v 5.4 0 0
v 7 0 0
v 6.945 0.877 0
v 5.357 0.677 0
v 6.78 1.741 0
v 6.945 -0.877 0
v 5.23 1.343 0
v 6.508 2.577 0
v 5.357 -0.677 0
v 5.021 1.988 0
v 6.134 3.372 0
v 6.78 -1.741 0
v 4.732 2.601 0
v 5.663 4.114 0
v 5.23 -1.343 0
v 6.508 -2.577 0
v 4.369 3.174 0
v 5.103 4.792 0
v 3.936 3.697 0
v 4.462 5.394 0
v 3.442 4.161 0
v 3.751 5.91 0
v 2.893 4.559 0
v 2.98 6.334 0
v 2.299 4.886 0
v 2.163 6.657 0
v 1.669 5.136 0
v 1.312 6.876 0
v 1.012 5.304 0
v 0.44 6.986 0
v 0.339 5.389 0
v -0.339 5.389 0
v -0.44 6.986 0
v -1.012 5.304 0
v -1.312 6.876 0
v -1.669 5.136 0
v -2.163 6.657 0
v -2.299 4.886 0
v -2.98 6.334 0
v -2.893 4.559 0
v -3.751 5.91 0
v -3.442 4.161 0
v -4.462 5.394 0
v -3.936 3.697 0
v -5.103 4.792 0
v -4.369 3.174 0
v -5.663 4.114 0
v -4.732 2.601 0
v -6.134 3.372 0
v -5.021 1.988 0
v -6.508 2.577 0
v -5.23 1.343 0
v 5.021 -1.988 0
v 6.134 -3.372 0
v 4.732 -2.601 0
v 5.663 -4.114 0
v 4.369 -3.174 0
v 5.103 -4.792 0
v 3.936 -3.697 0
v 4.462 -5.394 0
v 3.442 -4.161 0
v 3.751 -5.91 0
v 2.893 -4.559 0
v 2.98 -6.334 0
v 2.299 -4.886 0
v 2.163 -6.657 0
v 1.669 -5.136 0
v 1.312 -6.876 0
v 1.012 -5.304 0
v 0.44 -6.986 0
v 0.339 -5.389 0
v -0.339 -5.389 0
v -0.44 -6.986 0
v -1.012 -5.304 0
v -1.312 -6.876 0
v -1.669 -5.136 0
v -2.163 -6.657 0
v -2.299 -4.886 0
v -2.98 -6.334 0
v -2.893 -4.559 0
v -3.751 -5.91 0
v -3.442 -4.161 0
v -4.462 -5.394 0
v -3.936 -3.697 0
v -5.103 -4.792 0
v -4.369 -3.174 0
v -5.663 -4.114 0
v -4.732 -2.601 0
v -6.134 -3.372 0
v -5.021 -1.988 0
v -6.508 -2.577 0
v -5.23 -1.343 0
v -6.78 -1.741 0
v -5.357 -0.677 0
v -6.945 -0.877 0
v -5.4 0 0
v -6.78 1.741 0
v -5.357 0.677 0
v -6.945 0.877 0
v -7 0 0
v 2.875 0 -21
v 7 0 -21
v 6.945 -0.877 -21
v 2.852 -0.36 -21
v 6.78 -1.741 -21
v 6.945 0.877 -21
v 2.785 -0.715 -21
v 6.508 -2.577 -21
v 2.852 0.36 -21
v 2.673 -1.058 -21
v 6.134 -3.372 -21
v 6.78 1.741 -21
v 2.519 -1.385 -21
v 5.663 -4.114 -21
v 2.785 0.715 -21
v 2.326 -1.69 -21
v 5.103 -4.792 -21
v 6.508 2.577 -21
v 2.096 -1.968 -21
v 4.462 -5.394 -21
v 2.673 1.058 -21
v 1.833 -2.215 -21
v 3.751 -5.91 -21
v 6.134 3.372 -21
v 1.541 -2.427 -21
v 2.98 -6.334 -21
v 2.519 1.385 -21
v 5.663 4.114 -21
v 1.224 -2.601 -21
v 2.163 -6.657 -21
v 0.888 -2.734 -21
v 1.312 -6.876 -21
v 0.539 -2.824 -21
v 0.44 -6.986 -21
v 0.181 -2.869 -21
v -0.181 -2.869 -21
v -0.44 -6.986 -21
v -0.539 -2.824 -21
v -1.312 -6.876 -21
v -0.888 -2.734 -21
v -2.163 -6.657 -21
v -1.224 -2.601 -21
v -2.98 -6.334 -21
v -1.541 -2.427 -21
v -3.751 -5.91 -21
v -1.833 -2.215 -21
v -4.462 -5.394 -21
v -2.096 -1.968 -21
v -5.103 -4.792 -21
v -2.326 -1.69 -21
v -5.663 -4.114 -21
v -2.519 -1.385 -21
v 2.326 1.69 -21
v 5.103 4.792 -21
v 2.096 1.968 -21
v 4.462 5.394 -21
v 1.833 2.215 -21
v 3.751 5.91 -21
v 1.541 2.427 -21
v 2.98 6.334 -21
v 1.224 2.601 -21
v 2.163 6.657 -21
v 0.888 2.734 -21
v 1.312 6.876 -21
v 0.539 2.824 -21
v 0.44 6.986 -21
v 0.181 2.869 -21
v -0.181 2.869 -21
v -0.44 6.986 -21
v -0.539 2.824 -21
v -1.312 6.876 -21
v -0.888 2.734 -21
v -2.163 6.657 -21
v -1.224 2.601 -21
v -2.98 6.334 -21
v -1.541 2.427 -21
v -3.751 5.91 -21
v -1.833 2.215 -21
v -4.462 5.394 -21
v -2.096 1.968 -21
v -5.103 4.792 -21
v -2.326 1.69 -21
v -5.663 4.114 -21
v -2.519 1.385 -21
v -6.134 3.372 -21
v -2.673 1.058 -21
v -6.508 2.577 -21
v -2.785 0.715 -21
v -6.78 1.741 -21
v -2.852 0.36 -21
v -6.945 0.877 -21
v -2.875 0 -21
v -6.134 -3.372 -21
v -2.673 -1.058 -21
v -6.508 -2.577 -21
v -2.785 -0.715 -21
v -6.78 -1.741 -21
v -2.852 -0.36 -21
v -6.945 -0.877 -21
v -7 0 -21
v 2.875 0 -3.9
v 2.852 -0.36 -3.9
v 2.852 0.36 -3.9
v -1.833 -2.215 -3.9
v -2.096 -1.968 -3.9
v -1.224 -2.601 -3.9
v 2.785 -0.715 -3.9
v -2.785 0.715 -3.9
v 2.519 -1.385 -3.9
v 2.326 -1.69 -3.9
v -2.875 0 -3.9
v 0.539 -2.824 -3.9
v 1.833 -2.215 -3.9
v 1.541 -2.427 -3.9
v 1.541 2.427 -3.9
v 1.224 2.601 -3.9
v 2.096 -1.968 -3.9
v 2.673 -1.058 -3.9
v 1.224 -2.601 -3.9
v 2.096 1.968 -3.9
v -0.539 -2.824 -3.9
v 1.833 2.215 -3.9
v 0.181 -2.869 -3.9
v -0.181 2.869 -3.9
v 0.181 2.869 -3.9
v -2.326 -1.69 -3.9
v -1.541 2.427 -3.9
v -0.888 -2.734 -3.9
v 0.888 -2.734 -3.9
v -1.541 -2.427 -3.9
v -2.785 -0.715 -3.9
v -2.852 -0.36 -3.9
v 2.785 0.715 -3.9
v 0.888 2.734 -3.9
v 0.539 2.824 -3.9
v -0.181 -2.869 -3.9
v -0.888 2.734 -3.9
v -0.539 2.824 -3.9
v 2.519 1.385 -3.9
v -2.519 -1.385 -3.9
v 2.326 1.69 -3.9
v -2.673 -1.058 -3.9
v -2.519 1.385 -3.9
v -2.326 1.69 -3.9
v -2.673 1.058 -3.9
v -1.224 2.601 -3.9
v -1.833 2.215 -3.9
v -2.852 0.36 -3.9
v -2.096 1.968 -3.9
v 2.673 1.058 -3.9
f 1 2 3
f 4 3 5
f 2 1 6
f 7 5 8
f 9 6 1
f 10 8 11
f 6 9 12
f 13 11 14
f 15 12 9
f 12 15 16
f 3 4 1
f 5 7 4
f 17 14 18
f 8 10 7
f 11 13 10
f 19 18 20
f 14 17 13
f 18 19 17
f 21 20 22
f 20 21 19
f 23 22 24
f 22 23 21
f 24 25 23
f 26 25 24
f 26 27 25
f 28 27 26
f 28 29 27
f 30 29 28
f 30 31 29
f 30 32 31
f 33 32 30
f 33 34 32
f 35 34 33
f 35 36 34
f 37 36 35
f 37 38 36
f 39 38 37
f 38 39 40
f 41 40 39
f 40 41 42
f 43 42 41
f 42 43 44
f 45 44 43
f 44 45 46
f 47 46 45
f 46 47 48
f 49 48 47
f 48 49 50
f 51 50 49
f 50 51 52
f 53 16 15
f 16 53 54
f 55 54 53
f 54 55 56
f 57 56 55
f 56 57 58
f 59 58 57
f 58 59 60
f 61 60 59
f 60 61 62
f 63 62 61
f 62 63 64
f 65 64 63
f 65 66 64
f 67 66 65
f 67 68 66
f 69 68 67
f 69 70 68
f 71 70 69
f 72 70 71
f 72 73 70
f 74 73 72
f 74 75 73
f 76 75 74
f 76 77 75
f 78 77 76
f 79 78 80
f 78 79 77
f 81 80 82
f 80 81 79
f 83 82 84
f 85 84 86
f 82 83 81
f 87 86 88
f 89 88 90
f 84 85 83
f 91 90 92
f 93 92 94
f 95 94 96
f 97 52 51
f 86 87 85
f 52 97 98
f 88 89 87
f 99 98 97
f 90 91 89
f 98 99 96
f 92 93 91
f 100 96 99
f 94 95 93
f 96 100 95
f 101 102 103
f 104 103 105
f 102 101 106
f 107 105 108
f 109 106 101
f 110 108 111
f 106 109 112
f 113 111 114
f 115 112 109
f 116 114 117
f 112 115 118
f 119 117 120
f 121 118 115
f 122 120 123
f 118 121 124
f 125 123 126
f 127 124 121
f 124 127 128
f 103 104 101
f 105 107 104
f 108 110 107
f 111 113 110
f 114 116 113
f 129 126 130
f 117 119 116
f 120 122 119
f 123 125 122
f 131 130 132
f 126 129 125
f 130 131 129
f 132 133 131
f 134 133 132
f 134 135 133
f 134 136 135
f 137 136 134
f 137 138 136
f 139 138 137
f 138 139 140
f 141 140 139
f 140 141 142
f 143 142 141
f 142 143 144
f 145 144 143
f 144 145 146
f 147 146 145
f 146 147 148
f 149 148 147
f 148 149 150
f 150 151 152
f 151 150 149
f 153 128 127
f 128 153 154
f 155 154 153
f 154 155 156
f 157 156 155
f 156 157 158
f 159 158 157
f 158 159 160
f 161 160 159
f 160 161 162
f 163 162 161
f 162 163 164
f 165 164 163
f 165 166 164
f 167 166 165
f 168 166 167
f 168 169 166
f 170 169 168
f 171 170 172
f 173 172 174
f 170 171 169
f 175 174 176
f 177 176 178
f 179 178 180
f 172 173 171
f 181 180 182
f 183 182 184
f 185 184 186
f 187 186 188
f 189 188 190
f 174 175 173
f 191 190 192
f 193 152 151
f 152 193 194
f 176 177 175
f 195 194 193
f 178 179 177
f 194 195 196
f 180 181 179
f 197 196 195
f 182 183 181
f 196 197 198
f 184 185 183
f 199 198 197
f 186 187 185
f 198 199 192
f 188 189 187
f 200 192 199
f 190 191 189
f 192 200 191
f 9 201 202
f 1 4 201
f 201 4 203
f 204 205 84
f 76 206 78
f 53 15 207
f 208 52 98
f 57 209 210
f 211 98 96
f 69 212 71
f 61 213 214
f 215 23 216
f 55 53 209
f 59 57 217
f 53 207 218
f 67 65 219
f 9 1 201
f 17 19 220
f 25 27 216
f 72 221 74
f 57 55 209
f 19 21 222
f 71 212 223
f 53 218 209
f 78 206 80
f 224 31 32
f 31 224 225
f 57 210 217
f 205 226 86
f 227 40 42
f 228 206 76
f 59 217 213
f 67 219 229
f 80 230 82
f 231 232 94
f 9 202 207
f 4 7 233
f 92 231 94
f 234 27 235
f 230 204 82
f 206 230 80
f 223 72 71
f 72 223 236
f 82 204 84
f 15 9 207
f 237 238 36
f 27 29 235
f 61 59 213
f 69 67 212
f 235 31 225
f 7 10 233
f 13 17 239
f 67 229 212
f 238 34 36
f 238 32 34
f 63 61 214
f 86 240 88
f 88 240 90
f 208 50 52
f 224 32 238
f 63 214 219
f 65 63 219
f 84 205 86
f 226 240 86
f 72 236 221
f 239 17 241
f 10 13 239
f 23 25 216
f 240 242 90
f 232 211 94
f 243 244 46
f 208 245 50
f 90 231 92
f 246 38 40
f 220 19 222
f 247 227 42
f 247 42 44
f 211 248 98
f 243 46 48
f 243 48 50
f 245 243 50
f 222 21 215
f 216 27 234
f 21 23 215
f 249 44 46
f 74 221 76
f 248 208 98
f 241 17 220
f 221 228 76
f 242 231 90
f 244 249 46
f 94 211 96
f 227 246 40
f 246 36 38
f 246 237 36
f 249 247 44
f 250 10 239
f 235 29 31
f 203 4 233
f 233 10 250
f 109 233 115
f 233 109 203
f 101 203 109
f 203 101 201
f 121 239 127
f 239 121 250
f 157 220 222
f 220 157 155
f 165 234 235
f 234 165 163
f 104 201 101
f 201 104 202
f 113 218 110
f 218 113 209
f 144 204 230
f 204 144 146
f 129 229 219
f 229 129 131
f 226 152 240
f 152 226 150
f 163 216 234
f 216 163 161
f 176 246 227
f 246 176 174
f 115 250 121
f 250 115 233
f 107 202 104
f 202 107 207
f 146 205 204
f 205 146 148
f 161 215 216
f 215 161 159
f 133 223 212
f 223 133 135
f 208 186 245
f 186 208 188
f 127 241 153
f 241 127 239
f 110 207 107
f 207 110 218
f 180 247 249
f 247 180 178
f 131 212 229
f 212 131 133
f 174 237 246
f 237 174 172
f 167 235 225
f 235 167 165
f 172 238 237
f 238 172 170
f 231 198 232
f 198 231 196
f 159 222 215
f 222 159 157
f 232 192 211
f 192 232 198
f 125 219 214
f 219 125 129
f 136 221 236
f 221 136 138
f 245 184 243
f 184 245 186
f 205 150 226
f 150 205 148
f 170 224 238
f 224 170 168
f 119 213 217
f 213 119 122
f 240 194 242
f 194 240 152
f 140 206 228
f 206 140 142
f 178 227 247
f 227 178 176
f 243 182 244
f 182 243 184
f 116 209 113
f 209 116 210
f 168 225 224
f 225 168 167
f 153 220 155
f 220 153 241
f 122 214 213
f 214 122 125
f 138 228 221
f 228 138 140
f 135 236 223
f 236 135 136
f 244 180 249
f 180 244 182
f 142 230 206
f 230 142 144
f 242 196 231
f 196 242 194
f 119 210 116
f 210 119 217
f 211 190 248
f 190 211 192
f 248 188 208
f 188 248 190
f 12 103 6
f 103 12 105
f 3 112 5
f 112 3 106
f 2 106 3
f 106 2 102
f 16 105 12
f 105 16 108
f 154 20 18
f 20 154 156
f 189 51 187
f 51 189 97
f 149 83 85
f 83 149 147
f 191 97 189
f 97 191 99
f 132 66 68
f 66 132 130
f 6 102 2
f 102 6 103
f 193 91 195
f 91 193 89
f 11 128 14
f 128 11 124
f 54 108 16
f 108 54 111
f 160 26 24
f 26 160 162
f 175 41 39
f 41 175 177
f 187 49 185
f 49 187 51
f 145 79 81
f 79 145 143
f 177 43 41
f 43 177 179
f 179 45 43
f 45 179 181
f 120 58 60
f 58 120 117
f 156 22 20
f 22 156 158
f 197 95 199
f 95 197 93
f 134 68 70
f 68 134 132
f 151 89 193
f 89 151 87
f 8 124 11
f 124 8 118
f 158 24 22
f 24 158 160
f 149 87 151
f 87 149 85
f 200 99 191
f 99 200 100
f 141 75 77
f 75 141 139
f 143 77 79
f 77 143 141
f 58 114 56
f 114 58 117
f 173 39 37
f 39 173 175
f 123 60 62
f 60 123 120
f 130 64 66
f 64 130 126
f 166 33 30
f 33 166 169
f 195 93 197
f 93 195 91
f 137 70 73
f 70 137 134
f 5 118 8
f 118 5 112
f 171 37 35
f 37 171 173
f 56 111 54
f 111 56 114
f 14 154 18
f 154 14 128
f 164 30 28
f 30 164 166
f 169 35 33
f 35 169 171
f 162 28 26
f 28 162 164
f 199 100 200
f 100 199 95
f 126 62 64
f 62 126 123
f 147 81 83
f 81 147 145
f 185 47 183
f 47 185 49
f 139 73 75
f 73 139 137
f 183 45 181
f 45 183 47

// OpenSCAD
$fn = 50;


difference() {
	union() {
		translate(v = [0, 0, -21.0000000000]) {
			cylinder(h = 21, r = 7.0000000000);
		}
		cylinder(h = 0, r = 10.0000000000);
	}
	union() {
		translate(v = [0, 0, 0]) {
			rotate(a = [0, 0, 0]) {
				difference() {
					union() {
						#translate(v = [0, 0, -21.0000000000]) {
							cylinder(h = 21, r = 2.6000000000);
						}
						#translate(v = [0, 0, -3.9000000000]) {
							cylinder(h = 3.9000000000, r = 7.0000000000, r1 = 2.8750000000, r2 = 5.4000000000);
						}
						#translate(v = [0, 0, -21.0000000000]) {
							cylinder(h = 21, r = 2.8750000000);
						}
						#translate(v = [0, 0, -21.0000000000]) {
							cylinder(h = 21, r = 2.6000000000);
						}
					}
					union();
				}
			}
		}
	}
}
